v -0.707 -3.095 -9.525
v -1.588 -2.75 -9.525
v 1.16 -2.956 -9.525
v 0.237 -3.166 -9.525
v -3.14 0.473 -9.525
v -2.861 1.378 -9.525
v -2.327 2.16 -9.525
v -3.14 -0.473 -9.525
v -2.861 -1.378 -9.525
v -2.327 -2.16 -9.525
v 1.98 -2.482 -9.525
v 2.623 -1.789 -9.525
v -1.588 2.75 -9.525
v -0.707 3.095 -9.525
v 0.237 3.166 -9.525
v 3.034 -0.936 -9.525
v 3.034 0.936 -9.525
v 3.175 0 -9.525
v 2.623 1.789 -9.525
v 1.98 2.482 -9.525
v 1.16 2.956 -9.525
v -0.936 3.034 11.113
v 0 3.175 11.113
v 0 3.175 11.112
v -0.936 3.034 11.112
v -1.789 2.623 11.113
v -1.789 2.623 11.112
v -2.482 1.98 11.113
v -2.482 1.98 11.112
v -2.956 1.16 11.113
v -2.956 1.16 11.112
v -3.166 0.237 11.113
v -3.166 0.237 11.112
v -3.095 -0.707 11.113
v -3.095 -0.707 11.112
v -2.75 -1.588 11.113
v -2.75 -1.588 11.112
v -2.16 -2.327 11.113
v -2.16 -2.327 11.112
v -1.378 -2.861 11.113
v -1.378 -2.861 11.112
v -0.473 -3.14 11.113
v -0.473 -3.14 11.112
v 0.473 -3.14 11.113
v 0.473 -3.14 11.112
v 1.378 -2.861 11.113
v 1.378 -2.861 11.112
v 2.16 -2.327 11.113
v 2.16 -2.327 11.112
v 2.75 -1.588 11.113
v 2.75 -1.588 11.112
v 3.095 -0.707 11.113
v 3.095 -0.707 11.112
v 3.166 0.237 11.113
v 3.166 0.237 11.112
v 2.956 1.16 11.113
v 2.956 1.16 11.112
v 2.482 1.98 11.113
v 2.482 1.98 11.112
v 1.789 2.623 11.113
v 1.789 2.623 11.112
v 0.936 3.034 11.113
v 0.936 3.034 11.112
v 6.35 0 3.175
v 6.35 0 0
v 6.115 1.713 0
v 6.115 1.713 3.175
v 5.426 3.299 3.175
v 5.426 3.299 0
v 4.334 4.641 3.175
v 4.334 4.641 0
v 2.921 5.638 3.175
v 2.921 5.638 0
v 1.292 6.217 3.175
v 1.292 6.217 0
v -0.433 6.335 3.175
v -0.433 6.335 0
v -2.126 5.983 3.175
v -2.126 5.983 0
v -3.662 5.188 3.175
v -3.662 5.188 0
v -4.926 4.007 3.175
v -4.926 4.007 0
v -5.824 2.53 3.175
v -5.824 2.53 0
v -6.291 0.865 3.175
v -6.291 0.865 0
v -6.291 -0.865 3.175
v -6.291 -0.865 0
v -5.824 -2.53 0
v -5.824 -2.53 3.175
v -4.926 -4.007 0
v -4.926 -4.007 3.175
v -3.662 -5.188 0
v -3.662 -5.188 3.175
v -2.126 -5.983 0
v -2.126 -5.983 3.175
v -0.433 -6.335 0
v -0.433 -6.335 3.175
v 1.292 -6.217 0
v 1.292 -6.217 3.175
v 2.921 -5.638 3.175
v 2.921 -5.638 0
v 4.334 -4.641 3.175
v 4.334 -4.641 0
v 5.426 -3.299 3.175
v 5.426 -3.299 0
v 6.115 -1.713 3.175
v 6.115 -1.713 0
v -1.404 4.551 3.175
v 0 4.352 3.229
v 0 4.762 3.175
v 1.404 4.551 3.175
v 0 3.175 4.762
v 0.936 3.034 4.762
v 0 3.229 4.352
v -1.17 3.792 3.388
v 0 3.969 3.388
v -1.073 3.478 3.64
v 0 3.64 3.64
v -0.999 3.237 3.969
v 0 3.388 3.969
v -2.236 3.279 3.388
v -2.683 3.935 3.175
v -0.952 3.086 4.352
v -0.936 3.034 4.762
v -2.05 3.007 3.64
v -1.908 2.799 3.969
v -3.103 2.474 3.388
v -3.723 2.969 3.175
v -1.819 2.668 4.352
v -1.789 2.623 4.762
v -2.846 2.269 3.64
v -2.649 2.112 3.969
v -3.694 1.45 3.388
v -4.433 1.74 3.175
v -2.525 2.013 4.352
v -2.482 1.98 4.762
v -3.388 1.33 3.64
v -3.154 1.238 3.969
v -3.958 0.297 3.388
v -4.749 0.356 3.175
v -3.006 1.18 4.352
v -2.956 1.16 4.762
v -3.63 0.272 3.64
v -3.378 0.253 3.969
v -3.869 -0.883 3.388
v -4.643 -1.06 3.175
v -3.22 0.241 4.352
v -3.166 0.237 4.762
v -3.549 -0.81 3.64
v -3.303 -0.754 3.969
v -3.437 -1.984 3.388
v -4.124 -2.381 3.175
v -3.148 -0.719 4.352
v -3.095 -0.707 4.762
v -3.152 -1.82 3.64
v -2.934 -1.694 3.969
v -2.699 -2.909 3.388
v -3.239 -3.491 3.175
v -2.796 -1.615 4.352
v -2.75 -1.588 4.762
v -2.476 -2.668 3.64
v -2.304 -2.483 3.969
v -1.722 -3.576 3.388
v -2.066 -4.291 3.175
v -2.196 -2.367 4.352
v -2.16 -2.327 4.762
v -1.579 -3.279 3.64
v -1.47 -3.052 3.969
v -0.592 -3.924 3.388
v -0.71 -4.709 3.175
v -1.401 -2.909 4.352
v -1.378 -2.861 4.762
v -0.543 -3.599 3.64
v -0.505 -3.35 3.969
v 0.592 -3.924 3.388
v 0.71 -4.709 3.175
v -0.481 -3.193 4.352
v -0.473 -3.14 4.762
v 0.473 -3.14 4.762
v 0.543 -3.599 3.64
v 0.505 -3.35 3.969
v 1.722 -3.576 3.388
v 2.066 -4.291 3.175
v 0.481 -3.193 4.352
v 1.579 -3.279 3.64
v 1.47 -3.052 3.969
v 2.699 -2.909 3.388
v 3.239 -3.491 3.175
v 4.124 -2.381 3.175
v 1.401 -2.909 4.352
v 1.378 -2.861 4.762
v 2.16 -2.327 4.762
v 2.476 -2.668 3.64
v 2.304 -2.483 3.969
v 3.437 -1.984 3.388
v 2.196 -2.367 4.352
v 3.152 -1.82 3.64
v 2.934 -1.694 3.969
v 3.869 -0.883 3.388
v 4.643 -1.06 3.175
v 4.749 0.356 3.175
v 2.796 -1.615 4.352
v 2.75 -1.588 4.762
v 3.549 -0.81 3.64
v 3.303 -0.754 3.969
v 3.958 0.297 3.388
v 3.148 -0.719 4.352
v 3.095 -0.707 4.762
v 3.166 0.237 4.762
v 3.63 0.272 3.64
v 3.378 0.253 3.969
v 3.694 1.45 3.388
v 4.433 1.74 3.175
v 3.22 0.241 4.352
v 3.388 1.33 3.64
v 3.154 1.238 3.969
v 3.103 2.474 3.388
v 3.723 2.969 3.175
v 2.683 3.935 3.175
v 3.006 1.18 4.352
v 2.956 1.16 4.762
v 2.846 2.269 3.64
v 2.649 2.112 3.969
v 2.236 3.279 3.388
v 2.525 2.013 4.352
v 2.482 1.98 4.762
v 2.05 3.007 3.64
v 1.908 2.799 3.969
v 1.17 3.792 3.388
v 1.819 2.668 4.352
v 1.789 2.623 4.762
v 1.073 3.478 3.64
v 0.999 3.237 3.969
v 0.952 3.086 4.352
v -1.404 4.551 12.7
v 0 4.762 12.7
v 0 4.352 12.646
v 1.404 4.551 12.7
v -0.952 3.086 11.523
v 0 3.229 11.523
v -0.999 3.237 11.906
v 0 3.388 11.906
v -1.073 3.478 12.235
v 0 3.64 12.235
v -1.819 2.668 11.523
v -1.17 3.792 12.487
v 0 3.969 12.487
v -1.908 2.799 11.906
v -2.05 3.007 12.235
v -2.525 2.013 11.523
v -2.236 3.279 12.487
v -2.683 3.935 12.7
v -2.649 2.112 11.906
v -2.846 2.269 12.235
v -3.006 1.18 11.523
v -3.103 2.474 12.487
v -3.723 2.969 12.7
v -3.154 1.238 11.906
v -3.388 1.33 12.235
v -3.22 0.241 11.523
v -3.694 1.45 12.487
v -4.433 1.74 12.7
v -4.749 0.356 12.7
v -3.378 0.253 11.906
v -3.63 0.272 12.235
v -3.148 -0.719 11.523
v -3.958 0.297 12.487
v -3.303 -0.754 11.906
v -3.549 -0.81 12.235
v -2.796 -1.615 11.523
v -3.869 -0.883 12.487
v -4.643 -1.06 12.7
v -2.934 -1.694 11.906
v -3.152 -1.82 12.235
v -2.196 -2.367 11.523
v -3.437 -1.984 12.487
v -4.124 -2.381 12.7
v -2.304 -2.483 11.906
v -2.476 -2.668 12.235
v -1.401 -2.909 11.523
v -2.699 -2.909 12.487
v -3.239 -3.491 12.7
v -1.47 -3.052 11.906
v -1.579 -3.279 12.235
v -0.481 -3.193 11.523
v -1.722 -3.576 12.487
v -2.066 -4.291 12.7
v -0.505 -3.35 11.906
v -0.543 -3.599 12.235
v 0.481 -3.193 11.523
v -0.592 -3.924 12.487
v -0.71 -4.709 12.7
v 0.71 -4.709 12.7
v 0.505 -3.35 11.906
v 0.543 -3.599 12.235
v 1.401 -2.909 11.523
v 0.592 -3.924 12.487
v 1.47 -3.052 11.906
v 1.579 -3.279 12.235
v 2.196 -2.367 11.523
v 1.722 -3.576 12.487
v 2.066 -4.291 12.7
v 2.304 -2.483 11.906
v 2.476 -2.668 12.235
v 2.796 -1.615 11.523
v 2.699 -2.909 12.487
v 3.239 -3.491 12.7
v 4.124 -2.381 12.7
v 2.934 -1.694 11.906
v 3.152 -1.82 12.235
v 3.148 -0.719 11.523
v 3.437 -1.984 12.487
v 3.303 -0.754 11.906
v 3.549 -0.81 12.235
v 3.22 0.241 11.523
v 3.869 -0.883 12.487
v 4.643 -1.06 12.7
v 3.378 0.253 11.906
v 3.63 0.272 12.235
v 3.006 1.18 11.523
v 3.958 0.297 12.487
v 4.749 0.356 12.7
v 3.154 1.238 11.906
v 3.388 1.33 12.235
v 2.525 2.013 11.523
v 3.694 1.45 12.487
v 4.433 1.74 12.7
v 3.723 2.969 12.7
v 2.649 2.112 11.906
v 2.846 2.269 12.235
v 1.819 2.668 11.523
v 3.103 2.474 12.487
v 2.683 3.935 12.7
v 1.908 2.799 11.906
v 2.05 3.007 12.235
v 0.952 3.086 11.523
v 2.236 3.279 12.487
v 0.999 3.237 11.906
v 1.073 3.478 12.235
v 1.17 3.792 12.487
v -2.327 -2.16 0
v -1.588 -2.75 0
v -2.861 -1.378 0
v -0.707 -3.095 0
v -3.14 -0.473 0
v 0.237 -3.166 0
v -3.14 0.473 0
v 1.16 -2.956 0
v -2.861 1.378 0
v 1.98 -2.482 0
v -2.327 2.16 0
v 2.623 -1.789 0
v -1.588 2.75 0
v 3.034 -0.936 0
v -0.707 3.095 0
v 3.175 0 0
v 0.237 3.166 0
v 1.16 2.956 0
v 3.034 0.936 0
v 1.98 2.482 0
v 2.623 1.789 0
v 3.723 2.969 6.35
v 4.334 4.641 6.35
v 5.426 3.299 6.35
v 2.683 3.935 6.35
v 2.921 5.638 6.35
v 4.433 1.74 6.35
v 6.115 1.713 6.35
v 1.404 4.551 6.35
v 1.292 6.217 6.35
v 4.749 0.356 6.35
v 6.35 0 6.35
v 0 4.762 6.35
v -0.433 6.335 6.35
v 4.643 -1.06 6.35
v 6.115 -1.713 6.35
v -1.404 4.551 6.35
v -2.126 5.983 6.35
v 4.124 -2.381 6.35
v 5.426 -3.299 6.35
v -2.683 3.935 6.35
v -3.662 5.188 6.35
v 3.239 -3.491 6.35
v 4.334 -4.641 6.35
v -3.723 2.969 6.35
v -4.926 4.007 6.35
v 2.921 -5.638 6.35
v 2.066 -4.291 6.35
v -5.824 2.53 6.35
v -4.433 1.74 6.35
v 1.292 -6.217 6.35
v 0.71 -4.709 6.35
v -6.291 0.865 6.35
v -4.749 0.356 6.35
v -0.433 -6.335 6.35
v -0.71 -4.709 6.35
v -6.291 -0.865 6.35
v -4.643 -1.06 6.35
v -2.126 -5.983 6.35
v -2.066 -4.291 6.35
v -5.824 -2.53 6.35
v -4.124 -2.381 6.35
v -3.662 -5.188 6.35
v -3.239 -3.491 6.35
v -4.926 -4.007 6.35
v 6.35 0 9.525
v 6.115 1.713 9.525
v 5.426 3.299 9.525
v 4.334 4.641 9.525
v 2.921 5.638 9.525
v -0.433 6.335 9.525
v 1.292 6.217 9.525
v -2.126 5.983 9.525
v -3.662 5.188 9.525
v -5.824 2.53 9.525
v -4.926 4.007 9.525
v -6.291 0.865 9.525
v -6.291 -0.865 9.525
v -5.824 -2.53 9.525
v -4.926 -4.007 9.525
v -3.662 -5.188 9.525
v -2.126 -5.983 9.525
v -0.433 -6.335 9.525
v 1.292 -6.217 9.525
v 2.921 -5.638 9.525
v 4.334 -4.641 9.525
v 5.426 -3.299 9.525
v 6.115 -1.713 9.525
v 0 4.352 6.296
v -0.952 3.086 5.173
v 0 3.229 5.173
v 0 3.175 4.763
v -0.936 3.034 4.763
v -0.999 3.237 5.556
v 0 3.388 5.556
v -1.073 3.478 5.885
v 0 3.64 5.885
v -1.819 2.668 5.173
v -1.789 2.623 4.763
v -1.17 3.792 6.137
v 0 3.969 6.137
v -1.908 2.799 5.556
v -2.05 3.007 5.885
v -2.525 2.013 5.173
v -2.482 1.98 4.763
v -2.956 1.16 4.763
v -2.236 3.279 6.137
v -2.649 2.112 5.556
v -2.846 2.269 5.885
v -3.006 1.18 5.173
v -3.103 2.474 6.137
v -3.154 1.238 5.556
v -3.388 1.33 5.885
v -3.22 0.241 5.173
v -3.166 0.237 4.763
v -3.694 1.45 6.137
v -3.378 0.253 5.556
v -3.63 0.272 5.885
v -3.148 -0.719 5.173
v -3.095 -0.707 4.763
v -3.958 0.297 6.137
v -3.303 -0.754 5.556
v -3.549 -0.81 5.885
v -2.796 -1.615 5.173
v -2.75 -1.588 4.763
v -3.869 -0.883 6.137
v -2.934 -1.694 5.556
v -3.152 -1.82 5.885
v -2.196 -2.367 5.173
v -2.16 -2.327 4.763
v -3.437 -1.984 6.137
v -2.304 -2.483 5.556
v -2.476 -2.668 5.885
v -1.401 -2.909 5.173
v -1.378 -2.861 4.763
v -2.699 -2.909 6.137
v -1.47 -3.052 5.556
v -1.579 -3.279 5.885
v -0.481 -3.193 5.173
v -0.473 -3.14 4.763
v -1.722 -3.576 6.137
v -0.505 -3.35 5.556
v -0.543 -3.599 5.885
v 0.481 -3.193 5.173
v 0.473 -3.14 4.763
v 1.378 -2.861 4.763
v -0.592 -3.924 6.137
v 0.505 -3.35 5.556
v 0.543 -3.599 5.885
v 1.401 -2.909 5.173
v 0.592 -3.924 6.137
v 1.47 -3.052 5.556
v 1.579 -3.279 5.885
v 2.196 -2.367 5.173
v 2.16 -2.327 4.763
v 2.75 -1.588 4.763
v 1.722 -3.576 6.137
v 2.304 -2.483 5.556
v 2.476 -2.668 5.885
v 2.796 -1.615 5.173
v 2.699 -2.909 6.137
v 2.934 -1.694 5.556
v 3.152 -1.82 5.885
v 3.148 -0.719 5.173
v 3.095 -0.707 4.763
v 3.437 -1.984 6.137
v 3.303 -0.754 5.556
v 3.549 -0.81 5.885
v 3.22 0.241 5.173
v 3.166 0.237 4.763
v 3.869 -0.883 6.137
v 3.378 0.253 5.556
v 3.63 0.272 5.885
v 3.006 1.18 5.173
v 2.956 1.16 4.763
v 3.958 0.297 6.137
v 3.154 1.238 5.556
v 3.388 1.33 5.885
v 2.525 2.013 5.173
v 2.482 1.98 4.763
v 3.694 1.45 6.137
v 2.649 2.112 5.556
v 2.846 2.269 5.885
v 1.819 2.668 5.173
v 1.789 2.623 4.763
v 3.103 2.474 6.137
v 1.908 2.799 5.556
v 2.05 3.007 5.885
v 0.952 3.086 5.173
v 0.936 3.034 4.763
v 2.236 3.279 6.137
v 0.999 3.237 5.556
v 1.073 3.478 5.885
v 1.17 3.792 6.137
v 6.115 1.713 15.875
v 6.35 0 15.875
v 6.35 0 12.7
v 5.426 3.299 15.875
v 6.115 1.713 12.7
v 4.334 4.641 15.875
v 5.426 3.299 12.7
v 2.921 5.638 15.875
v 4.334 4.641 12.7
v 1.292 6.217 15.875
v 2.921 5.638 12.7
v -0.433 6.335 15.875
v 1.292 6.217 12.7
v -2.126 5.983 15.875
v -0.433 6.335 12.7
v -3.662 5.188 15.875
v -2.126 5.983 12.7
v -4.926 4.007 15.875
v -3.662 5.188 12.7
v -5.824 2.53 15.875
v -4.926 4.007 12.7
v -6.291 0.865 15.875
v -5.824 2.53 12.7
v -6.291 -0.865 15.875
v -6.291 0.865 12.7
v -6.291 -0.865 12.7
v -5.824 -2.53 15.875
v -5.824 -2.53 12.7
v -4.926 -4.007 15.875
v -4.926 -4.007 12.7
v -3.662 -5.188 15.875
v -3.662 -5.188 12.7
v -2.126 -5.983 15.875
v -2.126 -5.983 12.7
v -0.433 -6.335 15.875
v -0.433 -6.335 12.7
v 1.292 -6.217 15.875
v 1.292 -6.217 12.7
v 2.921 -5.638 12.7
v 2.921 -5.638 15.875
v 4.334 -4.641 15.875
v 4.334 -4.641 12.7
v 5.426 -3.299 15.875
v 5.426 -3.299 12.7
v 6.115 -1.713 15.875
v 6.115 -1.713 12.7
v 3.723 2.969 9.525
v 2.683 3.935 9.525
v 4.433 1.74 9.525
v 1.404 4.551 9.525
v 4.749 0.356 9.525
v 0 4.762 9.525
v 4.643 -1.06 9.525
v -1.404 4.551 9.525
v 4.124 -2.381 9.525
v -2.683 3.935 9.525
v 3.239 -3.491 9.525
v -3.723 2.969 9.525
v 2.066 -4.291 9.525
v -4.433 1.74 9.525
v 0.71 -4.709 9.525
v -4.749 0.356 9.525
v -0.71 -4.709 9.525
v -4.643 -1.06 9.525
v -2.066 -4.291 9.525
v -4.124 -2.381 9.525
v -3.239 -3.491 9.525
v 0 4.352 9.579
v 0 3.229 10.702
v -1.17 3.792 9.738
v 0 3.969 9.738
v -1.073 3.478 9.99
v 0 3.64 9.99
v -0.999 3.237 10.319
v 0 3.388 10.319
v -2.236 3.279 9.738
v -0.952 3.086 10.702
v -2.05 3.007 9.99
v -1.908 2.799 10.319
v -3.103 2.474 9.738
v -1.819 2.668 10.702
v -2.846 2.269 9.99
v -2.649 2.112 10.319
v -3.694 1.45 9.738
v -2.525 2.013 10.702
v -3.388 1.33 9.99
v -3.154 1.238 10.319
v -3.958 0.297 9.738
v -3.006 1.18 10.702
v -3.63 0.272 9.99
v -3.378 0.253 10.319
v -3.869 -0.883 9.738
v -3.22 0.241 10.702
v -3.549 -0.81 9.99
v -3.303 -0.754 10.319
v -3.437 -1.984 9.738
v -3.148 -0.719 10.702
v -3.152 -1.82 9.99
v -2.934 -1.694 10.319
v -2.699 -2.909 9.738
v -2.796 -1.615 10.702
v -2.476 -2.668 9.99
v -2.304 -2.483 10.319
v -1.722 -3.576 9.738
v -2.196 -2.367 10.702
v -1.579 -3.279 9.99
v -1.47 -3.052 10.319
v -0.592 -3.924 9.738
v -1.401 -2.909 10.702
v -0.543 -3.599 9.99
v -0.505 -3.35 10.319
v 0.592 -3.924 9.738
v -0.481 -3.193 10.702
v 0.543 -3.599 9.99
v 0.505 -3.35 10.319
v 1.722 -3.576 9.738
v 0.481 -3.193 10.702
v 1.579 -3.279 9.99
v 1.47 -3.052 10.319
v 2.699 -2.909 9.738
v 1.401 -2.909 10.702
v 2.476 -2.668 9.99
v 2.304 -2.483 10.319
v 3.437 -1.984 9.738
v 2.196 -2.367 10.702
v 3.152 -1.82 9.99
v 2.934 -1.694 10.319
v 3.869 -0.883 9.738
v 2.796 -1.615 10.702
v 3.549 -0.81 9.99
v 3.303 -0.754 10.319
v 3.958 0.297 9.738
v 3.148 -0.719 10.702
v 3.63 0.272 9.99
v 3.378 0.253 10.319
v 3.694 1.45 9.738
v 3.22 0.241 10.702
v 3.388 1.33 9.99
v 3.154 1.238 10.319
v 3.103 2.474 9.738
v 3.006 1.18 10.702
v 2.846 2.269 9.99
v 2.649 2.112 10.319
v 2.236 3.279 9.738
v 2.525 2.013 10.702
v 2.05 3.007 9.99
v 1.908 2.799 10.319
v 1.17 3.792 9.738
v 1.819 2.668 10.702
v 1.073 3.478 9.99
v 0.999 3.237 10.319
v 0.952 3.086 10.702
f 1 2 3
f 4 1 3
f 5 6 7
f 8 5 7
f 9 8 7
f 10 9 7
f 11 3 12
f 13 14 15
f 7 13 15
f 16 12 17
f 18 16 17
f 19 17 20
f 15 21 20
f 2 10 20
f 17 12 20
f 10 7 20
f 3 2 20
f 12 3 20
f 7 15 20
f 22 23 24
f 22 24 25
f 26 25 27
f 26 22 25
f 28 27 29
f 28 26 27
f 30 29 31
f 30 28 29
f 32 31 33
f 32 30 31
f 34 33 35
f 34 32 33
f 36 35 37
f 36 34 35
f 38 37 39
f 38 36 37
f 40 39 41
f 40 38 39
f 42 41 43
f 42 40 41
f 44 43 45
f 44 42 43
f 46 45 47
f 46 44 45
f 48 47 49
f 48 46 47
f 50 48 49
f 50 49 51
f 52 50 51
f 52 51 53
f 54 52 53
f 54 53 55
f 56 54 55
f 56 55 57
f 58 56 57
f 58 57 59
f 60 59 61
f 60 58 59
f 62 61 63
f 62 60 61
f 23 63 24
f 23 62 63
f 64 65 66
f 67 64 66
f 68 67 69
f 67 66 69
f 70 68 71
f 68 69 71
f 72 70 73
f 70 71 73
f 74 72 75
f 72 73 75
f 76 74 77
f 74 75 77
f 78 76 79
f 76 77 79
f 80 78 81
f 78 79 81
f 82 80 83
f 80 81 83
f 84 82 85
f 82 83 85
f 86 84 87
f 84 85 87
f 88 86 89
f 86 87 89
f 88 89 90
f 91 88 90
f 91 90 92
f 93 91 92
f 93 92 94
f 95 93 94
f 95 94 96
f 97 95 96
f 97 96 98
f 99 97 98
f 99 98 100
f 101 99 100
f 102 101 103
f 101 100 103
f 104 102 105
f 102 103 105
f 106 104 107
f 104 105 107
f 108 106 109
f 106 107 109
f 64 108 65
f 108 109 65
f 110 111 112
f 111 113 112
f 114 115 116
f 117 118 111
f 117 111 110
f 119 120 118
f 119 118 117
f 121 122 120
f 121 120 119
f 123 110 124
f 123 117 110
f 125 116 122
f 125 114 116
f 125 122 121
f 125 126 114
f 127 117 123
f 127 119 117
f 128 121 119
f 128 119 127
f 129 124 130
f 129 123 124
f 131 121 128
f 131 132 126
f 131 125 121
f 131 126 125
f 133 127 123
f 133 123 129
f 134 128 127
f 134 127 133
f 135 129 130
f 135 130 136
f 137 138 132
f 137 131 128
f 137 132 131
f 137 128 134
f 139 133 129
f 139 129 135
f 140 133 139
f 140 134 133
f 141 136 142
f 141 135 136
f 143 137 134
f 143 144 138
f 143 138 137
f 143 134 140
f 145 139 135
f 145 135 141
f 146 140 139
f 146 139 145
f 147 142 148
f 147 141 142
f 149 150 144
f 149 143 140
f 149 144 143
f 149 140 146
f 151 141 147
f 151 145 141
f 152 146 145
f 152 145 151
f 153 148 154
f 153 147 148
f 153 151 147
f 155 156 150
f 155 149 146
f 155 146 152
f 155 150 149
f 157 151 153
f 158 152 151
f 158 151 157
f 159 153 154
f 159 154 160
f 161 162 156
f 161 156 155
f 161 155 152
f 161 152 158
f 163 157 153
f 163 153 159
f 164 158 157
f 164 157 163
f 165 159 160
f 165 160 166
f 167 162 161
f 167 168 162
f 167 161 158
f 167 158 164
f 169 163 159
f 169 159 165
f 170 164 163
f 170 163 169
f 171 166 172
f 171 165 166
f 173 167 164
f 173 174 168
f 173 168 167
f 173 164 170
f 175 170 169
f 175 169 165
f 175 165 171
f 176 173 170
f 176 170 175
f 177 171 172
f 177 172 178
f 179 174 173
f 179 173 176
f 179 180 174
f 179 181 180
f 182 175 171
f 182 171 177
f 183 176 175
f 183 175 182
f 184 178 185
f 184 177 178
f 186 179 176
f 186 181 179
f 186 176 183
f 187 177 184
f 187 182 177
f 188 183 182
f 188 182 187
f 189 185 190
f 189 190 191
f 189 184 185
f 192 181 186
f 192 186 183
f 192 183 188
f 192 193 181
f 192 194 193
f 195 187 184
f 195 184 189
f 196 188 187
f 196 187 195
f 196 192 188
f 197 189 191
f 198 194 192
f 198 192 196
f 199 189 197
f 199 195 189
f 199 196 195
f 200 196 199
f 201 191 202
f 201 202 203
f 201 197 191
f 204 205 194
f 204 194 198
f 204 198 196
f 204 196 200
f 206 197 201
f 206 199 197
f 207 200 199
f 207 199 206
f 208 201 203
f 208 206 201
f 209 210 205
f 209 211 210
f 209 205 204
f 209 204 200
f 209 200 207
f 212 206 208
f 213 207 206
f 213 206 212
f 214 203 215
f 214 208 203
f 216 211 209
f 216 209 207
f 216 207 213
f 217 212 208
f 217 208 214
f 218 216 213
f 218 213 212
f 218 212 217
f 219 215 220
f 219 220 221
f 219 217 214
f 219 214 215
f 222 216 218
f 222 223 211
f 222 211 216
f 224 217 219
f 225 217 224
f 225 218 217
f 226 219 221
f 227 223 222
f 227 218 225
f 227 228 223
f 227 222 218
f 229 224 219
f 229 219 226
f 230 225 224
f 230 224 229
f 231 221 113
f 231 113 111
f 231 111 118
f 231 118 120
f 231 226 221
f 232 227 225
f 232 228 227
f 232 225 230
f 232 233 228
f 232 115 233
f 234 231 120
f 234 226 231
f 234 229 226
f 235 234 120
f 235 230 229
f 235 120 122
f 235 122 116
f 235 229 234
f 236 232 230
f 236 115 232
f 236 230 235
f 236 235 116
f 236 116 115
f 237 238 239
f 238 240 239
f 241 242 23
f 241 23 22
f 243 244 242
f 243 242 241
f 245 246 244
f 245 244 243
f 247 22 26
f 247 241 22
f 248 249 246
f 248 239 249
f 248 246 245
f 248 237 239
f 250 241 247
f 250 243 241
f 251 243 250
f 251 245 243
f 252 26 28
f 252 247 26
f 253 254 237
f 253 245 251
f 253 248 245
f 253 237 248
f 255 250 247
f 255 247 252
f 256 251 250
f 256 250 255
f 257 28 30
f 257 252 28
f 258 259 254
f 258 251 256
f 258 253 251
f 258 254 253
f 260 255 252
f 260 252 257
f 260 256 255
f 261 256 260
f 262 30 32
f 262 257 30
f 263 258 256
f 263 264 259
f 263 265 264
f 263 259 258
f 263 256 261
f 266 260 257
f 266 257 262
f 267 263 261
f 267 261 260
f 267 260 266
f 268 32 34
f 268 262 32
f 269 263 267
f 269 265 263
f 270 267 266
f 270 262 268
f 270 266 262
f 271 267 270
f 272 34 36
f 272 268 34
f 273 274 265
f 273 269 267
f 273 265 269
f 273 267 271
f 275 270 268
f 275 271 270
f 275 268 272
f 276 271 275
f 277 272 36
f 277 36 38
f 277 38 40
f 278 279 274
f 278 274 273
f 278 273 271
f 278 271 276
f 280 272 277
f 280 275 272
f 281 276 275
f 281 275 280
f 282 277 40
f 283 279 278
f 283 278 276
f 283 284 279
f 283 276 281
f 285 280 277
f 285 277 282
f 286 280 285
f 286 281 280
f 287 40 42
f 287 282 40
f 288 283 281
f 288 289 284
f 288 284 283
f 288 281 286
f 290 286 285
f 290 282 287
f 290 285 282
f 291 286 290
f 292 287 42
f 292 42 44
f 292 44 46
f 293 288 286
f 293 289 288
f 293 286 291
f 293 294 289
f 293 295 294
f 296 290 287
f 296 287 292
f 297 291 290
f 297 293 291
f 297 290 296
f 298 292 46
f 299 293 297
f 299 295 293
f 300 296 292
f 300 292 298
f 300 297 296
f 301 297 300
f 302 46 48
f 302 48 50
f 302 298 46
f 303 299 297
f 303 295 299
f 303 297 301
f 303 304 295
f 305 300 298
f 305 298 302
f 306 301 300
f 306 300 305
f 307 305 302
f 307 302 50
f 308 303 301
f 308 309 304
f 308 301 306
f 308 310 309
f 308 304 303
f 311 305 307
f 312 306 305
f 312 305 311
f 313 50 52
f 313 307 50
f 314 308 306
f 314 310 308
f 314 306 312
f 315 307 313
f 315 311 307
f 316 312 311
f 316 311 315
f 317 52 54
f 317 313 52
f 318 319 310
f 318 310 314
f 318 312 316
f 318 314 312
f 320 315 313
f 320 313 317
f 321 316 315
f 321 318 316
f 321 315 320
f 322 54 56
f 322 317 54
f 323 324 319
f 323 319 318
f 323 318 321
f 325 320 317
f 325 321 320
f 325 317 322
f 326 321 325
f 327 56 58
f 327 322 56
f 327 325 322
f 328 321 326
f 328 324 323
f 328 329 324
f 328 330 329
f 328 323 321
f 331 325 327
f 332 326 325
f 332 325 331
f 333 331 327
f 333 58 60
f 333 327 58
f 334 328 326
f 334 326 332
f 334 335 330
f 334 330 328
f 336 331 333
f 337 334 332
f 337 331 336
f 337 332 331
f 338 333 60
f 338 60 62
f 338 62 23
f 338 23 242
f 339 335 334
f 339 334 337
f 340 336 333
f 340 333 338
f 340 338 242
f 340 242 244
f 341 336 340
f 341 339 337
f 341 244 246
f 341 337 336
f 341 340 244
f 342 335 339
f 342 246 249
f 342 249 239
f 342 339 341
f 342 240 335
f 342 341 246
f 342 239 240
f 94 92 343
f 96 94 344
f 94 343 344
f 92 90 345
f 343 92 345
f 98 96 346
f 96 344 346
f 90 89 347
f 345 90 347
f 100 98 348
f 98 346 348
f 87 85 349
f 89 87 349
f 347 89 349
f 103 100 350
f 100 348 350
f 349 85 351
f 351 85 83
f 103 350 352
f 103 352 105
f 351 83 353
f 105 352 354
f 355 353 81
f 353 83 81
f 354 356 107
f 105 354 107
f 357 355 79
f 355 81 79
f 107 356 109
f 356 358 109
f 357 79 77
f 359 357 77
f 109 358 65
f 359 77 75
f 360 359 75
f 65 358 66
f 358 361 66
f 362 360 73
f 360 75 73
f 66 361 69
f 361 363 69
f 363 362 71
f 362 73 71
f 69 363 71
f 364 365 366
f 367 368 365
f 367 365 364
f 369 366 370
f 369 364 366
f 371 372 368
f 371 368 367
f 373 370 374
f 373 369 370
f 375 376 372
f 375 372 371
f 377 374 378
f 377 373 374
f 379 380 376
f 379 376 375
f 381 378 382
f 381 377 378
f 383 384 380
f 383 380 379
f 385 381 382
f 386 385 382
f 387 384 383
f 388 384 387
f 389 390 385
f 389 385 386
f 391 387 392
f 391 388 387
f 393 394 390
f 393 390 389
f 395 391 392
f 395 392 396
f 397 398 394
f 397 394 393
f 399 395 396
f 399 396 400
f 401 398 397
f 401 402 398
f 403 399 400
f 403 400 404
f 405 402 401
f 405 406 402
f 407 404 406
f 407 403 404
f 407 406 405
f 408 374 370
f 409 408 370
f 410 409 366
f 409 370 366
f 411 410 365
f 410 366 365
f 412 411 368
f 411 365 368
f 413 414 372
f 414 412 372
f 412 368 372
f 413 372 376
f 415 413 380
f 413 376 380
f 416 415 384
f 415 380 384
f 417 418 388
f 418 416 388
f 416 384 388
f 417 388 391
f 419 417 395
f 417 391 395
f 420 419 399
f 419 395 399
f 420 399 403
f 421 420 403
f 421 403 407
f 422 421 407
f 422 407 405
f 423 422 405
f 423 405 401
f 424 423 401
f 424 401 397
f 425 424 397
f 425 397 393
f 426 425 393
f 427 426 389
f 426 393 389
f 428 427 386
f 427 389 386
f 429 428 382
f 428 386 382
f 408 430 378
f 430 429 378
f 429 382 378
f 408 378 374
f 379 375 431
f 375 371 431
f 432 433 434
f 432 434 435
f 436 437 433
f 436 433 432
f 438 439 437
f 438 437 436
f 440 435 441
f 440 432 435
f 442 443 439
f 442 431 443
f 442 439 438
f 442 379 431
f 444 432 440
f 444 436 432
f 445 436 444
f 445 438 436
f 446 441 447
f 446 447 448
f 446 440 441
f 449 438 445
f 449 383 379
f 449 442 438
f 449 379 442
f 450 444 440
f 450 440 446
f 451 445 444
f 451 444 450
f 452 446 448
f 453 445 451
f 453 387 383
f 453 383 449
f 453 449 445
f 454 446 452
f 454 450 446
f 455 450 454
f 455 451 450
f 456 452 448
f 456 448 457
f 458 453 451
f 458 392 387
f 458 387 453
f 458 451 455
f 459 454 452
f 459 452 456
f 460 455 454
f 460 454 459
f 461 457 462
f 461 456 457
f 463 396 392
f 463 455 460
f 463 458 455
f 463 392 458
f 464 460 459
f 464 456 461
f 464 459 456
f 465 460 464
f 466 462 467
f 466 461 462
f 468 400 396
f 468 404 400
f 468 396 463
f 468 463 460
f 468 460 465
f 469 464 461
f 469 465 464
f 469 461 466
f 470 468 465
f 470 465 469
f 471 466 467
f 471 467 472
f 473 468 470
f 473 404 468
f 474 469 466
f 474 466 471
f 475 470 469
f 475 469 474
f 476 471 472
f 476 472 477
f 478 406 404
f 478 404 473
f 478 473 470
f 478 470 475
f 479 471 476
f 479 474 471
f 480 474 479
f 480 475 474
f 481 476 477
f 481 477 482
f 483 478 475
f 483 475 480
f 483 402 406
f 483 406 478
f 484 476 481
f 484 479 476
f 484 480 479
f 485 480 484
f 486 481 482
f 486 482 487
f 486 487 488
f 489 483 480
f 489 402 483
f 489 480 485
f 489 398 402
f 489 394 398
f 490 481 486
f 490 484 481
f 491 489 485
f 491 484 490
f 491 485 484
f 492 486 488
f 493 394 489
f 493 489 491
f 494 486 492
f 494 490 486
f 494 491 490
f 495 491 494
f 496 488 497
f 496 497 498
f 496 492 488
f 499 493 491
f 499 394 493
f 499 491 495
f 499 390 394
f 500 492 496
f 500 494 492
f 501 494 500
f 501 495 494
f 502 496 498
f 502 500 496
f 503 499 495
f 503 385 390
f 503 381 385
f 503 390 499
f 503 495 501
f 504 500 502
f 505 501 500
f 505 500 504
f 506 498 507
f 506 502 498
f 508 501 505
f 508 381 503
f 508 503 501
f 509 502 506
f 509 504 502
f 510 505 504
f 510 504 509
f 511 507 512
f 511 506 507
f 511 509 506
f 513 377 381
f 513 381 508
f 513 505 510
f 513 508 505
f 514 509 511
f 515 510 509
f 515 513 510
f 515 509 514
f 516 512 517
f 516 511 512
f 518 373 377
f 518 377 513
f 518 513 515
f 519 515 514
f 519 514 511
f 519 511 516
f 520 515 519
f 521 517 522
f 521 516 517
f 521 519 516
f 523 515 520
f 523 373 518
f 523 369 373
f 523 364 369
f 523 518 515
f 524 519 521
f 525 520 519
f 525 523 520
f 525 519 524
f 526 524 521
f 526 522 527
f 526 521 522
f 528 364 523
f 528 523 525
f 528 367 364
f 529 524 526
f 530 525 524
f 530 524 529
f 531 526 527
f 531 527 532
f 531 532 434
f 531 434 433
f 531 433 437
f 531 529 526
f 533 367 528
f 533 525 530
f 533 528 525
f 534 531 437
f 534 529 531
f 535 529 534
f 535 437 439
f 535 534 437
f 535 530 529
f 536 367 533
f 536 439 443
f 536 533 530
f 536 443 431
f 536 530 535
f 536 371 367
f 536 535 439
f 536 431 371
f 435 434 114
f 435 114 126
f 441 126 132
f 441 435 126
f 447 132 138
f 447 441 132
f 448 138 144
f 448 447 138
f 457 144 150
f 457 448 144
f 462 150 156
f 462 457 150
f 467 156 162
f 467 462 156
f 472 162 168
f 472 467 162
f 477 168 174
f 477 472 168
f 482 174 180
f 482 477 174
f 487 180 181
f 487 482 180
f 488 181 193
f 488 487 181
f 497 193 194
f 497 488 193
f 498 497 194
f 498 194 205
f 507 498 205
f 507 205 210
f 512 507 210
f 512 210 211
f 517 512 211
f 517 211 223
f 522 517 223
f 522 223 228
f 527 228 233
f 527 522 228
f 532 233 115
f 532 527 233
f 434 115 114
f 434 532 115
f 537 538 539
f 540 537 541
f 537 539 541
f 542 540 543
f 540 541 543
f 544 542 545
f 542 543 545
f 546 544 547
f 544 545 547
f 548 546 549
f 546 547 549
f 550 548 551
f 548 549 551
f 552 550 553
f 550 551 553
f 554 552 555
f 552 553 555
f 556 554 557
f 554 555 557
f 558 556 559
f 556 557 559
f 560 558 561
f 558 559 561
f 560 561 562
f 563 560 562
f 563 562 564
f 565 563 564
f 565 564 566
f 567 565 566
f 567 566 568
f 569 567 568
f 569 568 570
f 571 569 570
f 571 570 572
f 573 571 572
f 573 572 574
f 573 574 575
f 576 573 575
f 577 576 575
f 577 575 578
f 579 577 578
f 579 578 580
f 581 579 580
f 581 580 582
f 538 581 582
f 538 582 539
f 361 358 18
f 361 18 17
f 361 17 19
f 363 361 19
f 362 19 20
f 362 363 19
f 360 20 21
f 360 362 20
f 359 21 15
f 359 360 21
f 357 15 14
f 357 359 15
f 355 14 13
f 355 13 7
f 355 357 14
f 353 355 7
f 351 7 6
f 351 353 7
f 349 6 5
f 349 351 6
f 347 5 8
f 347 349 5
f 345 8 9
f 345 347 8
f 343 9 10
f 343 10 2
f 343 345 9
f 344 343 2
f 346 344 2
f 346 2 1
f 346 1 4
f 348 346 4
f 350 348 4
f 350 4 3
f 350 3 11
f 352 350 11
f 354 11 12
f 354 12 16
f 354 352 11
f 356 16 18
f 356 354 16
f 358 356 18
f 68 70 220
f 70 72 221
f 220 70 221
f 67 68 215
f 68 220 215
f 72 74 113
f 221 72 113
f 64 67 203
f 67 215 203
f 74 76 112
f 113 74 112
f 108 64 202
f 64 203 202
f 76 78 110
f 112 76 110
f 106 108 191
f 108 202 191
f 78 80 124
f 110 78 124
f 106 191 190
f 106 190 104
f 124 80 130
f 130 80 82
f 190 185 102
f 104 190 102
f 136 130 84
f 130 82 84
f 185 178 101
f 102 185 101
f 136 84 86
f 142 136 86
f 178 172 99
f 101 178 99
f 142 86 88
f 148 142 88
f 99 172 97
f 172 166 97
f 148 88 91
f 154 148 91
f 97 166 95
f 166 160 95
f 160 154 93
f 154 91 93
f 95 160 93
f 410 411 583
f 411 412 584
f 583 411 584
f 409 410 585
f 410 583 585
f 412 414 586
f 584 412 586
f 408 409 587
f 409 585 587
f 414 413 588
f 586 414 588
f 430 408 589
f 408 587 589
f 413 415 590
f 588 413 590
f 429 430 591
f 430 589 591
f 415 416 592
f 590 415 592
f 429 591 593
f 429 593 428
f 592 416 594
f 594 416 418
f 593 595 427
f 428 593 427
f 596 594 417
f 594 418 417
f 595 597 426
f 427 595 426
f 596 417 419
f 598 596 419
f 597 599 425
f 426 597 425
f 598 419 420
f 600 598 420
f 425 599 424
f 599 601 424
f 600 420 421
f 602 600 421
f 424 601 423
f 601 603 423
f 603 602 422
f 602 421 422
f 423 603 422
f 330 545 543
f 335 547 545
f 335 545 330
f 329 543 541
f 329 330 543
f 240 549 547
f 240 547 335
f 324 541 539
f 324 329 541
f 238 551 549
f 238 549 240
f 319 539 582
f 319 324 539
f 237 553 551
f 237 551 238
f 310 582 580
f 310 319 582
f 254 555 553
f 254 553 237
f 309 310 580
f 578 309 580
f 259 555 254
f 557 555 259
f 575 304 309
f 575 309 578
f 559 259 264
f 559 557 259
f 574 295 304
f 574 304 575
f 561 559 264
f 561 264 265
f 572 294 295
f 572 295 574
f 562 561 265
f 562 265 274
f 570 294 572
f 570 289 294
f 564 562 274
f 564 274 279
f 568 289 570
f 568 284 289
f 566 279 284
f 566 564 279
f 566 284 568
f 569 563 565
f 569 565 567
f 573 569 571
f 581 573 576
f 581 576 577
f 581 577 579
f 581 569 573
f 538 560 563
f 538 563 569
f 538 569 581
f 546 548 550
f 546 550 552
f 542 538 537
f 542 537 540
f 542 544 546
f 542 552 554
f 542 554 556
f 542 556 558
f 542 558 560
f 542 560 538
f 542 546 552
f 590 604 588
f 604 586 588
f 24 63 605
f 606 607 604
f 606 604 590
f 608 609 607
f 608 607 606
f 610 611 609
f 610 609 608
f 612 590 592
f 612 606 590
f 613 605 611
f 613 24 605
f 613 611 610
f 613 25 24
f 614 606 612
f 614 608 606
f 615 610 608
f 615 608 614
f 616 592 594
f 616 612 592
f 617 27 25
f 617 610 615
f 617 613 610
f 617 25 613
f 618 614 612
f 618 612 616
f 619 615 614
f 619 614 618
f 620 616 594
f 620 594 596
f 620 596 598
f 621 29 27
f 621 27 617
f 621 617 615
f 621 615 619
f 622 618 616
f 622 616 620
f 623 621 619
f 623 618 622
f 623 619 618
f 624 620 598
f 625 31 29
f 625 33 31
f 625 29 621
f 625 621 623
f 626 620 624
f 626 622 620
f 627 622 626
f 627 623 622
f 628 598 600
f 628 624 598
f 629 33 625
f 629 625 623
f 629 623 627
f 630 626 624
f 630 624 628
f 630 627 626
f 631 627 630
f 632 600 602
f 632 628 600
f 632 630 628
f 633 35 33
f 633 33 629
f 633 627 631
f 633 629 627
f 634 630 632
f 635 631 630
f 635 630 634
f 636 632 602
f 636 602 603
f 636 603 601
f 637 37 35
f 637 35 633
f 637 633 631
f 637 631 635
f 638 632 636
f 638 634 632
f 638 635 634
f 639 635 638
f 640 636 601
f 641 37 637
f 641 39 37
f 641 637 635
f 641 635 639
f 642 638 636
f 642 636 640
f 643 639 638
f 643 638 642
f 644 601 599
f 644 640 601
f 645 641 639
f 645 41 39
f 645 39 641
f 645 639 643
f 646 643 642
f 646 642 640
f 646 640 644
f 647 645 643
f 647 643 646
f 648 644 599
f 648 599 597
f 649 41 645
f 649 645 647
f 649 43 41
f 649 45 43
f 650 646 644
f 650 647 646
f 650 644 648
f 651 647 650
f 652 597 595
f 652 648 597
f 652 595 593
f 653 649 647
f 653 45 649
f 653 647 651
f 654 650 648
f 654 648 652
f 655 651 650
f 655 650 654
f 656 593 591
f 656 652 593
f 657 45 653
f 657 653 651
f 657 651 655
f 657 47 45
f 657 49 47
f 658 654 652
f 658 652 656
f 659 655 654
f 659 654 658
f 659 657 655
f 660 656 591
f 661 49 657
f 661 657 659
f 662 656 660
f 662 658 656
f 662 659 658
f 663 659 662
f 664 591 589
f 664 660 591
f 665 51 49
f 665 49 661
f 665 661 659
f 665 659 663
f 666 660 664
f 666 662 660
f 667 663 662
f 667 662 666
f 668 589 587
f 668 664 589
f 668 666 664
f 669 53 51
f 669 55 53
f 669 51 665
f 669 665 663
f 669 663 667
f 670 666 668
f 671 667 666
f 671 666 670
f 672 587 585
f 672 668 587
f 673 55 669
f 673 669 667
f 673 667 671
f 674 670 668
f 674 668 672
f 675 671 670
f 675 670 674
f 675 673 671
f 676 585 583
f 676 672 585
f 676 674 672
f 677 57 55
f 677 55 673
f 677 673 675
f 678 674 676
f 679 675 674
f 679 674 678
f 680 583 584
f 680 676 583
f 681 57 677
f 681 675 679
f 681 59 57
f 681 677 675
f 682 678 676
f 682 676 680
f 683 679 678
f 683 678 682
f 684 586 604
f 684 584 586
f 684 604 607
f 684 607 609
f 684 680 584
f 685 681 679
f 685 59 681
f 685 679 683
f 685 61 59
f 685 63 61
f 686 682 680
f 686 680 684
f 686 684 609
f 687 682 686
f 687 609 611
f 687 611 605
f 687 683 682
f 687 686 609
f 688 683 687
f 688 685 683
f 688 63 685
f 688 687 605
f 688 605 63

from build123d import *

# Parameters (mm, degrees)
F0_R     = 6.35
F0_R_2   = 3.175
F1_DEPTH = 15.875
F3_DEPTH = 9.525
F4_W     = 3.175
F4_H     = 3.175
F6_R     = 1.58749


# Not quite as in the source:
# - a fillet or chamfer is up to 0.001 mm smaller than in the source, because OpenCascade refuses the exact size


with BuildPart() as f1:
    # F0 (on Top) → F1 (new body)
    with BuildSketch(Plane.XY):
        Circle(F0_R)
        Circle(F0_R_2, mode=Mode.SUBTRACT)
        Circle(F0_R_2)
    extrude(amount=F1_DEPTH)

    # F0 (on Top) → F3 (join)
    with BuildSketch(Plane.XY):
        Circle(F0_R_2)
    extrude(amount=-F3_DEPTH)

    # F4 (on Right) → F5 (revolve, cut)
    with BuildSketch(Plane.YZ):
        with Locations((4.7625, 4.7625)):
            Rectangle(F4_W, F4_H)
        with Locations((4.7625, 11.1125)):
            Rectangle(F4_W, F4_H)
    revolve(axis=Axis((0, 0, -0.284396112), (0, 0, 1)), mode=Mode.SUBTRACT)

    # F6 (radius 1.5875 in the source; OpenCascade refuses exactly that, so slightly less here)
    f6_edges = [f1.edges().sort_by_distance(p)[0] for p in [
        (0, -3.175, 3.175),
        (0, -3.175, 6.35),
        (0, -3.175, 9.525),
        (0, -3.175, 12.7),
    ]]
    fillet(f6_edges, radius=F6_R)


solid = f1.part
